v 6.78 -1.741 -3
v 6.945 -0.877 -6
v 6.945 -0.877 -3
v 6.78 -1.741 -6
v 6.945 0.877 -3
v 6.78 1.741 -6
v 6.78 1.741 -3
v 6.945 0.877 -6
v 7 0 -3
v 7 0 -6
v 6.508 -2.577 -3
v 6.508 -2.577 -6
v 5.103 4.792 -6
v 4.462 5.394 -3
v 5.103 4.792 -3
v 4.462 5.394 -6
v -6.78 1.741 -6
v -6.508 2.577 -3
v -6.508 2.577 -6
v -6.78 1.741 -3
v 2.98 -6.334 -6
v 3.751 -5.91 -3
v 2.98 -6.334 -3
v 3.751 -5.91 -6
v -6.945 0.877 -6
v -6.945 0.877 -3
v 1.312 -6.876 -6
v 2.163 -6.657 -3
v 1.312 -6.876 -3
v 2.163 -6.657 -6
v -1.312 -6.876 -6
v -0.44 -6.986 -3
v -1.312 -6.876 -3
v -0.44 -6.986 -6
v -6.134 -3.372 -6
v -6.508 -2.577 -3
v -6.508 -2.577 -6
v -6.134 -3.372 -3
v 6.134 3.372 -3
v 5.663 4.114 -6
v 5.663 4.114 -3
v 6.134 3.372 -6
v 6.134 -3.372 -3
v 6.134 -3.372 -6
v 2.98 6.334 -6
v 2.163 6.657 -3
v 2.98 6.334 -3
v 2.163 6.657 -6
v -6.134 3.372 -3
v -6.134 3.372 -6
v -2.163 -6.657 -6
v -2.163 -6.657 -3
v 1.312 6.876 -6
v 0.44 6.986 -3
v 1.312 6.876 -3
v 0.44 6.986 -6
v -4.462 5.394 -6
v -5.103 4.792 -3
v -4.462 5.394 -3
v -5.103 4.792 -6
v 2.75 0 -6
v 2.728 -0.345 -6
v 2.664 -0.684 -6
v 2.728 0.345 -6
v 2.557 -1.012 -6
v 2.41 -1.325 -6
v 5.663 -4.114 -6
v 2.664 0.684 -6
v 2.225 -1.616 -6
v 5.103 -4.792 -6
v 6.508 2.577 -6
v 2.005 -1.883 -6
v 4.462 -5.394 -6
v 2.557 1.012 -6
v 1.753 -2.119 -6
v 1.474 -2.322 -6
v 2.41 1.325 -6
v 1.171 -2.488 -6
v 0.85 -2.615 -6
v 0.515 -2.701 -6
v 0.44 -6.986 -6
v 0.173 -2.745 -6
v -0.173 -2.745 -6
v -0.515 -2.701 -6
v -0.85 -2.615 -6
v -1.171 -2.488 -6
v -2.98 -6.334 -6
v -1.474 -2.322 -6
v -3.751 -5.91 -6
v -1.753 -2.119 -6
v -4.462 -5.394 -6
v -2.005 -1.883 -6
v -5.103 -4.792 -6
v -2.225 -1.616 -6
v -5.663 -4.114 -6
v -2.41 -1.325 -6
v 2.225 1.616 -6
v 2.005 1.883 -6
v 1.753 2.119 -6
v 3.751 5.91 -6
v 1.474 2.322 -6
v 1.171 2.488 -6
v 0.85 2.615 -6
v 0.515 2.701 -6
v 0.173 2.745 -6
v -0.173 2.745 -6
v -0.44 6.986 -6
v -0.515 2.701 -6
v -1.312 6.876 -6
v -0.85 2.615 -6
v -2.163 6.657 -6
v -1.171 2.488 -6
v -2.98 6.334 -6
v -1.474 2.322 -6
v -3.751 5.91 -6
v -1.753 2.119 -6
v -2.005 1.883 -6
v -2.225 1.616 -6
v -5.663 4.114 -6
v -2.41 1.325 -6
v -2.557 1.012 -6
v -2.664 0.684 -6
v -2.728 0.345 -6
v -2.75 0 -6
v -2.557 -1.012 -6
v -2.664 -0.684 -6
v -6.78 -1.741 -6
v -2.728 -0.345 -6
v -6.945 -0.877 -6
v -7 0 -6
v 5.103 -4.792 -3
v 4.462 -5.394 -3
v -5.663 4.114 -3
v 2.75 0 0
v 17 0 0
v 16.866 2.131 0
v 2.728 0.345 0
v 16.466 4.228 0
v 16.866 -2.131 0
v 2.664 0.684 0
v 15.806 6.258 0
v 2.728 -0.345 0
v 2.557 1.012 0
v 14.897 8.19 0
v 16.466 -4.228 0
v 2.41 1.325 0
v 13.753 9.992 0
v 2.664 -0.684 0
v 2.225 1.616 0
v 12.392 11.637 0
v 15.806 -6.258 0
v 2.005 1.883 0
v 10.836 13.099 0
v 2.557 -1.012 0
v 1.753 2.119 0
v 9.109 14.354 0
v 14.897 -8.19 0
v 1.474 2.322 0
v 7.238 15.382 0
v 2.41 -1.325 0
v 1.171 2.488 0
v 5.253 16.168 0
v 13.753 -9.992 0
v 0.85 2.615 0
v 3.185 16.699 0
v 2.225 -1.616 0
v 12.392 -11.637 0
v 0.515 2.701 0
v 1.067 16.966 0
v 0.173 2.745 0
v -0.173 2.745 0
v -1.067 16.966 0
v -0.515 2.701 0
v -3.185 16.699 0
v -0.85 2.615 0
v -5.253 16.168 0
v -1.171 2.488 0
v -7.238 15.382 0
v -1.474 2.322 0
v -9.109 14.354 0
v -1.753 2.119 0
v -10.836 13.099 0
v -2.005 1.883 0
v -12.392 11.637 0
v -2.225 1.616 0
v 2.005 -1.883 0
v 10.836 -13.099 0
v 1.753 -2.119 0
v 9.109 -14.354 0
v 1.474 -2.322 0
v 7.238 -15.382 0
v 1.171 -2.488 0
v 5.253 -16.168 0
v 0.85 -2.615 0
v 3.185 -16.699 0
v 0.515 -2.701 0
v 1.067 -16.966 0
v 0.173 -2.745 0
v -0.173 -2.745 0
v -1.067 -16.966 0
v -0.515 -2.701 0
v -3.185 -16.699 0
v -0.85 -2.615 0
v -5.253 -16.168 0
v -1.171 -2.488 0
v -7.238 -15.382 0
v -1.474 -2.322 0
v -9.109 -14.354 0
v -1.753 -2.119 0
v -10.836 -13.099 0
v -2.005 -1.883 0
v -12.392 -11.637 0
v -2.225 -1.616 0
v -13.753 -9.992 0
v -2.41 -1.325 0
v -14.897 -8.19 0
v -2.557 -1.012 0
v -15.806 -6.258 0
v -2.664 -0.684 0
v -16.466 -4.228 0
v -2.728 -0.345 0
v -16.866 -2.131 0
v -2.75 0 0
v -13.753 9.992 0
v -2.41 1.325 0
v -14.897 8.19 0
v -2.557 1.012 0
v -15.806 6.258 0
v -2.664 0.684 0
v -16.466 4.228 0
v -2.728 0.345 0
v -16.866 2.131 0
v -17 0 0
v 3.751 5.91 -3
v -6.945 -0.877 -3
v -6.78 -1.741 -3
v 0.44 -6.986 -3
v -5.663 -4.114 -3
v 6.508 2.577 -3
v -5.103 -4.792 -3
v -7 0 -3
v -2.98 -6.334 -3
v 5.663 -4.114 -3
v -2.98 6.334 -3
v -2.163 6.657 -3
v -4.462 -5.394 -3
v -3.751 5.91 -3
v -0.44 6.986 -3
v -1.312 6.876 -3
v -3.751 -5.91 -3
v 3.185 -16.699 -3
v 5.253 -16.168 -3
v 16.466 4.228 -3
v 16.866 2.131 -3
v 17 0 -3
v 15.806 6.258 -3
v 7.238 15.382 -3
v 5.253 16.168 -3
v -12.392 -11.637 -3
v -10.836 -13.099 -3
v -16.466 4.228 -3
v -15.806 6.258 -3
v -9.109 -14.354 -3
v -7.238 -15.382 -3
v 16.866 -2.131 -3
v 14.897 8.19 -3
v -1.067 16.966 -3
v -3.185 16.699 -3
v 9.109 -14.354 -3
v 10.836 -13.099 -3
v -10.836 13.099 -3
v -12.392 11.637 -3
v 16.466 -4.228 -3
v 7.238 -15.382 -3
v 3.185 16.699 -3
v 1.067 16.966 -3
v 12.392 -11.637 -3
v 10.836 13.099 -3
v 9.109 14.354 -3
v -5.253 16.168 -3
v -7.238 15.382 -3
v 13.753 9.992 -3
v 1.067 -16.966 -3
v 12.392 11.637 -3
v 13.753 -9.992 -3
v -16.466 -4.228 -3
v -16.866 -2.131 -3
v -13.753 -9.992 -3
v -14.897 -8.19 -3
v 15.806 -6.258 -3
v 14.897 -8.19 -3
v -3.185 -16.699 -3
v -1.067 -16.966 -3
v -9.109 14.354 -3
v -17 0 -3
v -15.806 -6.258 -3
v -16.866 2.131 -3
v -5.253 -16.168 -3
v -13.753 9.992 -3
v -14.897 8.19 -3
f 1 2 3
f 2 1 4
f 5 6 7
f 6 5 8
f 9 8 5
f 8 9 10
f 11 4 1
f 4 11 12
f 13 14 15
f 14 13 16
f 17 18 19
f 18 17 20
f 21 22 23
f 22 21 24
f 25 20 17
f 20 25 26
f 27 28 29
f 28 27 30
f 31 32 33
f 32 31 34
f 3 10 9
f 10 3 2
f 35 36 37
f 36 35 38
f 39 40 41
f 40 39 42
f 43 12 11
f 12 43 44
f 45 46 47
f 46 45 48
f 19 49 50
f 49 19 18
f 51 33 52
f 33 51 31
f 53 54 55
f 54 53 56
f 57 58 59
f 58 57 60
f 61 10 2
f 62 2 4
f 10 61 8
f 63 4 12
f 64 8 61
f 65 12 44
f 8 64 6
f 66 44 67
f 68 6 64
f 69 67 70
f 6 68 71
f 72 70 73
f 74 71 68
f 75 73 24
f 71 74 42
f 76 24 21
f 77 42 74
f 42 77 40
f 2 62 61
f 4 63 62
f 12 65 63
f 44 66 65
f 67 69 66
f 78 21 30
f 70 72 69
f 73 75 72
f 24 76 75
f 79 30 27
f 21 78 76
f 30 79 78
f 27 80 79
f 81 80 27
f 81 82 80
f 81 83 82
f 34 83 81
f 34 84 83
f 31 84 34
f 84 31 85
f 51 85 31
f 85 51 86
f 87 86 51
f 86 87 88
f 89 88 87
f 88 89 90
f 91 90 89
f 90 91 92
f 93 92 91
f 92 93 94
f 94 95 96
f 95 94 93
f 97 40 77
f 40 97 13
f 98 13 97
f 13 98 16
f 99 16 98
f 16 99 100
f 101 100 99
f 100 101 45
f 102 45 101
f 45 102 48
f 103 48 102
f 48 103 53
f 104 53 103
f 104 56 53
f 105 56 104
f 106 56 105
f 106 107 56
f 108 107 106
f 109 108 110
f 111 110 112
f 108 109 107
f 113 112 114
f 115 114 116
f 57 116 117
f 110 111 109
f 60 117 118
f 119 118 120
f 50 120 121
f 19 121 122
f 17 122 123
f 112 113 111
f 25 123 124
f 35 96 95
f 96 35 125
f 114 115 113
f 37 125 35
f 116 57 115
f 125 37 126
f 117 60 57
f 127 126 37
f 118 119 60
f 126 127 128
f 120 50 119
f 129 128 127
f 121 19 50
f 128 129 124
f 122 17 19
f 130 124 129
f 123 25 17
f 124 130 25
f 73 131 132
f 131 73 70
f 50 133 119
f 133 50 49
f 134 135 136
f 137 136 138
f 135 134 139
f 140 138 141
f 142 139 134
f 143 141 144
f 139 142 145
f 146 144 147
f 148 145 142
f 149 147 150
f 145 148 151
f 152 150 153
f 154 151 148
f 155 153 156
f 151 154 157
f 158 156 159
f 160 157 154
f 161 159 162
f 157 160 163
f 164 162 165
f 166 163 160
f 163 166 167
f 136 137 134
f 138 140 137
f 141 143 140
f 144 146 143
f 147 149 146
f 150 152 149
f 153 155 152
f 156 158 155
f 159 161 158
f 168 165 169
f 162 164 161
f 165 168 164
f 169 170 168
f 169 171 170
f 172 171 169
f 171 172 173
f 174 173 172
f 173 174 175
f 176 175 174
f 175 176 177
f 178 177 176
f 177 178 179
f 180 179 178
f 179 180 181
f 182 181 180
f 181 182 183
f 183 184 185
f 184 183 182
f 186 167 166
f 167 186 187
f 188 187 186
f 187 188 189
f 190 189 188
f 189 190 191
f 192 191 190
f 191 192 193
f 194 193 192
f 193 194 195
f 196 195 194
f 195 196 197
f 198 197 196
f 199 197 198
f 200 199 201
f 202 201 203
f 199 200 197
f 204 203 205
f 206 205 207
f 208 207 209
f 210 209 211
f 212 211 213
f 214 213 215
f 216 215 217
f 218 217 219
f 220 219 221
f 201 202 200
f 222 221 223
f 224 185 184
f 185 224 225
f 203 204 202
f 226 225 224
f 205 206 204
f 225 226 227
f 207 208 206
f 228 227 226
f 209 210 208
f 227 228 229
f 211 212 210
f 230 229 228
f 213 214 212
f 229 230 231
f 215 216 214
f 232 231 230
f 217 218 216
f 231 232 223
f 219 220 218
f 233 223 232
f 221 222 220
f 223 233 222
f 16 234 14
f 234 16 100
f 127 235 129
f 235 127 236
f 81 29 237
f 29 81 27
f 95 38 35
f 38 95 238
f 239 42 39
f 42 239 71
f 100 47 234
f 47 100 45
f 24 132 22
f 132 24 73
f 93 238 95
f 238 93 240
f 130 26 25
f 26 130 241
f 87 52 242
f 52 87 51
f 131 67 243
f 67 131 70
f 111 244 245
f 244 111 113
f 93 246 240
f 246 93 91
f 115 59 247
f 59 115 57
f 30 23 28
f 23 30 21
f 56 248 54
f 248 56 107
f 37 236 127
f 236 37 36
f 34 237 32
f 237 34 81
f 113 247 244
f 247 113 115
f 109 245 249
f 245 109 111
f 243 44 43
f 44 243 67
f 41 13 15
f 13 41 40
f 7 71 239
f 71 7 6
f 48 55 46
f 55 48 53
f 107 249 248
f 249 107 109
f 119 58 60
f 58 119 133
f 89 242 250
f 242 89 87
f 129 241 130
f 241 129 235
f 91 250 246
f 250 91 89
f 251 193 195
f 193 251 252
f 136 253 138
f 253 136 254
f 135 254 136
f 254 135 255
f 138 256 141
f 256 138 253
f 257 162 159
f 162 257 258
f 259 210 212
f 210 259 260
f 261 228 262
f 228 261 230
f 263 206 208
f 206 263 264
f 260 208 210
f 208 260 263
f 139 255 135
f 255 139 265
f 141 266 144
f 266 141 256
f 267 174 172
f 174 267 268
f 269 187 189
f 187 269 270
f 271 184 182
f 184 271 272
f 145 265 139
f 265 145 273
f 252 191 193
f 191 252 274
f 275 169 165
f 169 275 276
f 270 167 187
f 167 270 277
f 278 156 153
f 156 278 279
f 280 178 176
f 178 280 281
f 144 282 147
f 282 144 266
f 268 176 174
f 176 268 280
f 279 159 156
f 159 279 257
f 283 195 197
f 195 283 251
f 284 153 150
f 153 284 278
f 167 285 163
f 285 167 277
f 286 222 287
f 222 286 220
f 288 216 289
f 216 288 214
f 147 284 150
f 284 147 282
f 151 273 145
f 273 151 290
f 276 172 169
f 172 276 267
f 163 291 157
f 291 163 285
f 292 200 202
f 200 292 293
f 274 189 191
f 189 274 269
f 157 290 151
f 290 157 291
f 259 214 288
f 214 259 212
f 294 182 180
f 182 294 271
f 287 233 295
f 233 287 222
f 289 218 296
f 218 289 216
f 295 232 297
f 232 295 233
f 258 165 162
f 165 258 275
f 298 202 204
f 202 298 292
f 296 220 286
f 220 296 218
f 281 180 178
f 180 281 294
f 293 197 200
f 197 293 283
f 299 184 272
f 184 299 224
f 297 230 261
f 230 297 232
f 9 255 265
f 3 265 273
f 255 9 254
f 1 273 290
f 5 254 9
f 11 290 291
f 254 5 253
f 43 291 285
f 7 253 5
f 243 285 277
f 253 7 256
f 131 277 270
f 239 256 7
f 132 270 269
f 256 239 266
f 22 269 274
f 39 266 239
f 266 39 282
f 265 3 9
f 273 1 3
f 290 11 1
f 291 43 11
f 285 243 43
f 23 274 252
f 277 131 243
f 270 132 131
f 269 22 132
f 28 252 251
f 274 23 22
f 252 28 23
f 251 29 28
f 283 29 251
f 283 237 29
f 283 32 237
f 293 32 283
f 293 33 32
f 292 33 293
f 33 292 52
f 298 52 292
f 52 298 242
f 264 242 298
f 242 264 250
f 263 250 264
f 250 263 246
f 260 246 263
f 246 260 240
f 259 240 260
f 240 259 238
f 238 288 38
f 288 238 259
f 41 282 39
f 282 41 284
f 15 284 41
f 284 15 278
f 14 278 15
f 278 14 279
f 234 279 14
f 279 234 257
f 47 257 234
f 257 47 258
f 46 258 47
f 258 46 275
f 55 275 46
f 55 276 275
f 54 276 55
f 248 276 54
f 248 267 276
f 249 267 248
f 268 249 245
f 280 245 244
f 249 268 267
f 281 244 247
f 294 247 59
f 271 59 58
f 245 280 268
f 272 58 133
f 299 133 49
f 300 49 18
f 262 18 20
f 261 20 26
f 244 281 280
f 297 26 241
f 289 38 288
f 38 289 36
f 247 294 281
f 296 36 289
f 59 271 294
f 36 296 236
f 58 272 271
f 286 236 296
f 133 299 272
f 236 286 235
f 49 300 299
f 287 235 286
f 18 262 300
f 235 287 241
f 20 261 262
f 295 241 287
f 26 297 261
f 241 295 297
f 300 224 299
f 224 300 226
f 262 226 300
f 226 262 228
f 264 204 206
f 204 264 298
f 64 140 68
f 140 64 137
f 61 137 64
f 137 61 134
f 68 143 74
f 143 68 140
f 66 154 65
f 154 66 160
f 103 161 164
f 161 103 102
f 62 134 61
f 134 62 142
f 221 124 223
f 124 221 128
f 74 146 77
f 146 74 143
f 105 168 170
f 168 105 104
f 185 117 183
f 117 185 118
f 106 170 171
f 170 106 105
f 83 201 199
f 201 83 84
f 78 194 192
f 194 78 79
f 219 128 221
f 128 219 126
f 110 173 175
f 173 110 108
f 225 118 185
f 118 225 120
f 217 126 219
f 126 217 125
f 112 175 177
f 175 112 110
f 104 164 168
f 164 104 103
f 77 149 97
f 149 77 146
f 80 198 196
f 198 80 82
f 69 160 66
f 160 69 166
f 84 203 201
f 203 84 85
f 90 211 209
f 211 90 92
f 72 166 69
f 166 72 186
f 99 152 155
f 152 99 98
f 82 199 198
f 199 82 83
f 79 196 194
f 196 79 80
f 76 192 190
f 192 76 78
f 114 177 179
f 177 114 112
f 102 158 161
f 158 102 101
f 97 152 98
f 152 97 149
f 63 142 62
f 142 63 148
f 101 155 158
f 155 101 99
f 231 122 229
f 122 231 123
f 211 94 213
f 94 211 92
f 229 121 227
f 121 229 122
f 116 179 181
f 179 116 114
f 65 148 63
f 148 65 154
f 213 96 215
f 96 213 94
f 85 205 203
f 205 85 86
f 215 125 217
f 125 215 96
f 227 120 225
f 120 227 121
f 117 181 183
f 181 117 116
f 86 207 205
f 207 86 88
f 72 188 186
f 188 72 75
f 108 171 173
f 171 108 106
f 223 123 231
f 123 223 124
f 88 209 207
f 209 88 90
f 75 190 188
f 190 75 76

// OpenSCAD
$fn = 50;


difference() {
	union() {
		translate(v = [0, 0, -6.0000000000]) {
			cylinder(h = 6, r = 7.0000000000);
		}
		translate(v = [0, 0, -3.0000000000]) {
			cylinder(h = 3, r = 17.0000000000);
		}
	}
	union() {
		#translate(v = [0, 0, -6]) {
			cylinder(h = 6, r = 2.7500000000);
		}
	}
}
